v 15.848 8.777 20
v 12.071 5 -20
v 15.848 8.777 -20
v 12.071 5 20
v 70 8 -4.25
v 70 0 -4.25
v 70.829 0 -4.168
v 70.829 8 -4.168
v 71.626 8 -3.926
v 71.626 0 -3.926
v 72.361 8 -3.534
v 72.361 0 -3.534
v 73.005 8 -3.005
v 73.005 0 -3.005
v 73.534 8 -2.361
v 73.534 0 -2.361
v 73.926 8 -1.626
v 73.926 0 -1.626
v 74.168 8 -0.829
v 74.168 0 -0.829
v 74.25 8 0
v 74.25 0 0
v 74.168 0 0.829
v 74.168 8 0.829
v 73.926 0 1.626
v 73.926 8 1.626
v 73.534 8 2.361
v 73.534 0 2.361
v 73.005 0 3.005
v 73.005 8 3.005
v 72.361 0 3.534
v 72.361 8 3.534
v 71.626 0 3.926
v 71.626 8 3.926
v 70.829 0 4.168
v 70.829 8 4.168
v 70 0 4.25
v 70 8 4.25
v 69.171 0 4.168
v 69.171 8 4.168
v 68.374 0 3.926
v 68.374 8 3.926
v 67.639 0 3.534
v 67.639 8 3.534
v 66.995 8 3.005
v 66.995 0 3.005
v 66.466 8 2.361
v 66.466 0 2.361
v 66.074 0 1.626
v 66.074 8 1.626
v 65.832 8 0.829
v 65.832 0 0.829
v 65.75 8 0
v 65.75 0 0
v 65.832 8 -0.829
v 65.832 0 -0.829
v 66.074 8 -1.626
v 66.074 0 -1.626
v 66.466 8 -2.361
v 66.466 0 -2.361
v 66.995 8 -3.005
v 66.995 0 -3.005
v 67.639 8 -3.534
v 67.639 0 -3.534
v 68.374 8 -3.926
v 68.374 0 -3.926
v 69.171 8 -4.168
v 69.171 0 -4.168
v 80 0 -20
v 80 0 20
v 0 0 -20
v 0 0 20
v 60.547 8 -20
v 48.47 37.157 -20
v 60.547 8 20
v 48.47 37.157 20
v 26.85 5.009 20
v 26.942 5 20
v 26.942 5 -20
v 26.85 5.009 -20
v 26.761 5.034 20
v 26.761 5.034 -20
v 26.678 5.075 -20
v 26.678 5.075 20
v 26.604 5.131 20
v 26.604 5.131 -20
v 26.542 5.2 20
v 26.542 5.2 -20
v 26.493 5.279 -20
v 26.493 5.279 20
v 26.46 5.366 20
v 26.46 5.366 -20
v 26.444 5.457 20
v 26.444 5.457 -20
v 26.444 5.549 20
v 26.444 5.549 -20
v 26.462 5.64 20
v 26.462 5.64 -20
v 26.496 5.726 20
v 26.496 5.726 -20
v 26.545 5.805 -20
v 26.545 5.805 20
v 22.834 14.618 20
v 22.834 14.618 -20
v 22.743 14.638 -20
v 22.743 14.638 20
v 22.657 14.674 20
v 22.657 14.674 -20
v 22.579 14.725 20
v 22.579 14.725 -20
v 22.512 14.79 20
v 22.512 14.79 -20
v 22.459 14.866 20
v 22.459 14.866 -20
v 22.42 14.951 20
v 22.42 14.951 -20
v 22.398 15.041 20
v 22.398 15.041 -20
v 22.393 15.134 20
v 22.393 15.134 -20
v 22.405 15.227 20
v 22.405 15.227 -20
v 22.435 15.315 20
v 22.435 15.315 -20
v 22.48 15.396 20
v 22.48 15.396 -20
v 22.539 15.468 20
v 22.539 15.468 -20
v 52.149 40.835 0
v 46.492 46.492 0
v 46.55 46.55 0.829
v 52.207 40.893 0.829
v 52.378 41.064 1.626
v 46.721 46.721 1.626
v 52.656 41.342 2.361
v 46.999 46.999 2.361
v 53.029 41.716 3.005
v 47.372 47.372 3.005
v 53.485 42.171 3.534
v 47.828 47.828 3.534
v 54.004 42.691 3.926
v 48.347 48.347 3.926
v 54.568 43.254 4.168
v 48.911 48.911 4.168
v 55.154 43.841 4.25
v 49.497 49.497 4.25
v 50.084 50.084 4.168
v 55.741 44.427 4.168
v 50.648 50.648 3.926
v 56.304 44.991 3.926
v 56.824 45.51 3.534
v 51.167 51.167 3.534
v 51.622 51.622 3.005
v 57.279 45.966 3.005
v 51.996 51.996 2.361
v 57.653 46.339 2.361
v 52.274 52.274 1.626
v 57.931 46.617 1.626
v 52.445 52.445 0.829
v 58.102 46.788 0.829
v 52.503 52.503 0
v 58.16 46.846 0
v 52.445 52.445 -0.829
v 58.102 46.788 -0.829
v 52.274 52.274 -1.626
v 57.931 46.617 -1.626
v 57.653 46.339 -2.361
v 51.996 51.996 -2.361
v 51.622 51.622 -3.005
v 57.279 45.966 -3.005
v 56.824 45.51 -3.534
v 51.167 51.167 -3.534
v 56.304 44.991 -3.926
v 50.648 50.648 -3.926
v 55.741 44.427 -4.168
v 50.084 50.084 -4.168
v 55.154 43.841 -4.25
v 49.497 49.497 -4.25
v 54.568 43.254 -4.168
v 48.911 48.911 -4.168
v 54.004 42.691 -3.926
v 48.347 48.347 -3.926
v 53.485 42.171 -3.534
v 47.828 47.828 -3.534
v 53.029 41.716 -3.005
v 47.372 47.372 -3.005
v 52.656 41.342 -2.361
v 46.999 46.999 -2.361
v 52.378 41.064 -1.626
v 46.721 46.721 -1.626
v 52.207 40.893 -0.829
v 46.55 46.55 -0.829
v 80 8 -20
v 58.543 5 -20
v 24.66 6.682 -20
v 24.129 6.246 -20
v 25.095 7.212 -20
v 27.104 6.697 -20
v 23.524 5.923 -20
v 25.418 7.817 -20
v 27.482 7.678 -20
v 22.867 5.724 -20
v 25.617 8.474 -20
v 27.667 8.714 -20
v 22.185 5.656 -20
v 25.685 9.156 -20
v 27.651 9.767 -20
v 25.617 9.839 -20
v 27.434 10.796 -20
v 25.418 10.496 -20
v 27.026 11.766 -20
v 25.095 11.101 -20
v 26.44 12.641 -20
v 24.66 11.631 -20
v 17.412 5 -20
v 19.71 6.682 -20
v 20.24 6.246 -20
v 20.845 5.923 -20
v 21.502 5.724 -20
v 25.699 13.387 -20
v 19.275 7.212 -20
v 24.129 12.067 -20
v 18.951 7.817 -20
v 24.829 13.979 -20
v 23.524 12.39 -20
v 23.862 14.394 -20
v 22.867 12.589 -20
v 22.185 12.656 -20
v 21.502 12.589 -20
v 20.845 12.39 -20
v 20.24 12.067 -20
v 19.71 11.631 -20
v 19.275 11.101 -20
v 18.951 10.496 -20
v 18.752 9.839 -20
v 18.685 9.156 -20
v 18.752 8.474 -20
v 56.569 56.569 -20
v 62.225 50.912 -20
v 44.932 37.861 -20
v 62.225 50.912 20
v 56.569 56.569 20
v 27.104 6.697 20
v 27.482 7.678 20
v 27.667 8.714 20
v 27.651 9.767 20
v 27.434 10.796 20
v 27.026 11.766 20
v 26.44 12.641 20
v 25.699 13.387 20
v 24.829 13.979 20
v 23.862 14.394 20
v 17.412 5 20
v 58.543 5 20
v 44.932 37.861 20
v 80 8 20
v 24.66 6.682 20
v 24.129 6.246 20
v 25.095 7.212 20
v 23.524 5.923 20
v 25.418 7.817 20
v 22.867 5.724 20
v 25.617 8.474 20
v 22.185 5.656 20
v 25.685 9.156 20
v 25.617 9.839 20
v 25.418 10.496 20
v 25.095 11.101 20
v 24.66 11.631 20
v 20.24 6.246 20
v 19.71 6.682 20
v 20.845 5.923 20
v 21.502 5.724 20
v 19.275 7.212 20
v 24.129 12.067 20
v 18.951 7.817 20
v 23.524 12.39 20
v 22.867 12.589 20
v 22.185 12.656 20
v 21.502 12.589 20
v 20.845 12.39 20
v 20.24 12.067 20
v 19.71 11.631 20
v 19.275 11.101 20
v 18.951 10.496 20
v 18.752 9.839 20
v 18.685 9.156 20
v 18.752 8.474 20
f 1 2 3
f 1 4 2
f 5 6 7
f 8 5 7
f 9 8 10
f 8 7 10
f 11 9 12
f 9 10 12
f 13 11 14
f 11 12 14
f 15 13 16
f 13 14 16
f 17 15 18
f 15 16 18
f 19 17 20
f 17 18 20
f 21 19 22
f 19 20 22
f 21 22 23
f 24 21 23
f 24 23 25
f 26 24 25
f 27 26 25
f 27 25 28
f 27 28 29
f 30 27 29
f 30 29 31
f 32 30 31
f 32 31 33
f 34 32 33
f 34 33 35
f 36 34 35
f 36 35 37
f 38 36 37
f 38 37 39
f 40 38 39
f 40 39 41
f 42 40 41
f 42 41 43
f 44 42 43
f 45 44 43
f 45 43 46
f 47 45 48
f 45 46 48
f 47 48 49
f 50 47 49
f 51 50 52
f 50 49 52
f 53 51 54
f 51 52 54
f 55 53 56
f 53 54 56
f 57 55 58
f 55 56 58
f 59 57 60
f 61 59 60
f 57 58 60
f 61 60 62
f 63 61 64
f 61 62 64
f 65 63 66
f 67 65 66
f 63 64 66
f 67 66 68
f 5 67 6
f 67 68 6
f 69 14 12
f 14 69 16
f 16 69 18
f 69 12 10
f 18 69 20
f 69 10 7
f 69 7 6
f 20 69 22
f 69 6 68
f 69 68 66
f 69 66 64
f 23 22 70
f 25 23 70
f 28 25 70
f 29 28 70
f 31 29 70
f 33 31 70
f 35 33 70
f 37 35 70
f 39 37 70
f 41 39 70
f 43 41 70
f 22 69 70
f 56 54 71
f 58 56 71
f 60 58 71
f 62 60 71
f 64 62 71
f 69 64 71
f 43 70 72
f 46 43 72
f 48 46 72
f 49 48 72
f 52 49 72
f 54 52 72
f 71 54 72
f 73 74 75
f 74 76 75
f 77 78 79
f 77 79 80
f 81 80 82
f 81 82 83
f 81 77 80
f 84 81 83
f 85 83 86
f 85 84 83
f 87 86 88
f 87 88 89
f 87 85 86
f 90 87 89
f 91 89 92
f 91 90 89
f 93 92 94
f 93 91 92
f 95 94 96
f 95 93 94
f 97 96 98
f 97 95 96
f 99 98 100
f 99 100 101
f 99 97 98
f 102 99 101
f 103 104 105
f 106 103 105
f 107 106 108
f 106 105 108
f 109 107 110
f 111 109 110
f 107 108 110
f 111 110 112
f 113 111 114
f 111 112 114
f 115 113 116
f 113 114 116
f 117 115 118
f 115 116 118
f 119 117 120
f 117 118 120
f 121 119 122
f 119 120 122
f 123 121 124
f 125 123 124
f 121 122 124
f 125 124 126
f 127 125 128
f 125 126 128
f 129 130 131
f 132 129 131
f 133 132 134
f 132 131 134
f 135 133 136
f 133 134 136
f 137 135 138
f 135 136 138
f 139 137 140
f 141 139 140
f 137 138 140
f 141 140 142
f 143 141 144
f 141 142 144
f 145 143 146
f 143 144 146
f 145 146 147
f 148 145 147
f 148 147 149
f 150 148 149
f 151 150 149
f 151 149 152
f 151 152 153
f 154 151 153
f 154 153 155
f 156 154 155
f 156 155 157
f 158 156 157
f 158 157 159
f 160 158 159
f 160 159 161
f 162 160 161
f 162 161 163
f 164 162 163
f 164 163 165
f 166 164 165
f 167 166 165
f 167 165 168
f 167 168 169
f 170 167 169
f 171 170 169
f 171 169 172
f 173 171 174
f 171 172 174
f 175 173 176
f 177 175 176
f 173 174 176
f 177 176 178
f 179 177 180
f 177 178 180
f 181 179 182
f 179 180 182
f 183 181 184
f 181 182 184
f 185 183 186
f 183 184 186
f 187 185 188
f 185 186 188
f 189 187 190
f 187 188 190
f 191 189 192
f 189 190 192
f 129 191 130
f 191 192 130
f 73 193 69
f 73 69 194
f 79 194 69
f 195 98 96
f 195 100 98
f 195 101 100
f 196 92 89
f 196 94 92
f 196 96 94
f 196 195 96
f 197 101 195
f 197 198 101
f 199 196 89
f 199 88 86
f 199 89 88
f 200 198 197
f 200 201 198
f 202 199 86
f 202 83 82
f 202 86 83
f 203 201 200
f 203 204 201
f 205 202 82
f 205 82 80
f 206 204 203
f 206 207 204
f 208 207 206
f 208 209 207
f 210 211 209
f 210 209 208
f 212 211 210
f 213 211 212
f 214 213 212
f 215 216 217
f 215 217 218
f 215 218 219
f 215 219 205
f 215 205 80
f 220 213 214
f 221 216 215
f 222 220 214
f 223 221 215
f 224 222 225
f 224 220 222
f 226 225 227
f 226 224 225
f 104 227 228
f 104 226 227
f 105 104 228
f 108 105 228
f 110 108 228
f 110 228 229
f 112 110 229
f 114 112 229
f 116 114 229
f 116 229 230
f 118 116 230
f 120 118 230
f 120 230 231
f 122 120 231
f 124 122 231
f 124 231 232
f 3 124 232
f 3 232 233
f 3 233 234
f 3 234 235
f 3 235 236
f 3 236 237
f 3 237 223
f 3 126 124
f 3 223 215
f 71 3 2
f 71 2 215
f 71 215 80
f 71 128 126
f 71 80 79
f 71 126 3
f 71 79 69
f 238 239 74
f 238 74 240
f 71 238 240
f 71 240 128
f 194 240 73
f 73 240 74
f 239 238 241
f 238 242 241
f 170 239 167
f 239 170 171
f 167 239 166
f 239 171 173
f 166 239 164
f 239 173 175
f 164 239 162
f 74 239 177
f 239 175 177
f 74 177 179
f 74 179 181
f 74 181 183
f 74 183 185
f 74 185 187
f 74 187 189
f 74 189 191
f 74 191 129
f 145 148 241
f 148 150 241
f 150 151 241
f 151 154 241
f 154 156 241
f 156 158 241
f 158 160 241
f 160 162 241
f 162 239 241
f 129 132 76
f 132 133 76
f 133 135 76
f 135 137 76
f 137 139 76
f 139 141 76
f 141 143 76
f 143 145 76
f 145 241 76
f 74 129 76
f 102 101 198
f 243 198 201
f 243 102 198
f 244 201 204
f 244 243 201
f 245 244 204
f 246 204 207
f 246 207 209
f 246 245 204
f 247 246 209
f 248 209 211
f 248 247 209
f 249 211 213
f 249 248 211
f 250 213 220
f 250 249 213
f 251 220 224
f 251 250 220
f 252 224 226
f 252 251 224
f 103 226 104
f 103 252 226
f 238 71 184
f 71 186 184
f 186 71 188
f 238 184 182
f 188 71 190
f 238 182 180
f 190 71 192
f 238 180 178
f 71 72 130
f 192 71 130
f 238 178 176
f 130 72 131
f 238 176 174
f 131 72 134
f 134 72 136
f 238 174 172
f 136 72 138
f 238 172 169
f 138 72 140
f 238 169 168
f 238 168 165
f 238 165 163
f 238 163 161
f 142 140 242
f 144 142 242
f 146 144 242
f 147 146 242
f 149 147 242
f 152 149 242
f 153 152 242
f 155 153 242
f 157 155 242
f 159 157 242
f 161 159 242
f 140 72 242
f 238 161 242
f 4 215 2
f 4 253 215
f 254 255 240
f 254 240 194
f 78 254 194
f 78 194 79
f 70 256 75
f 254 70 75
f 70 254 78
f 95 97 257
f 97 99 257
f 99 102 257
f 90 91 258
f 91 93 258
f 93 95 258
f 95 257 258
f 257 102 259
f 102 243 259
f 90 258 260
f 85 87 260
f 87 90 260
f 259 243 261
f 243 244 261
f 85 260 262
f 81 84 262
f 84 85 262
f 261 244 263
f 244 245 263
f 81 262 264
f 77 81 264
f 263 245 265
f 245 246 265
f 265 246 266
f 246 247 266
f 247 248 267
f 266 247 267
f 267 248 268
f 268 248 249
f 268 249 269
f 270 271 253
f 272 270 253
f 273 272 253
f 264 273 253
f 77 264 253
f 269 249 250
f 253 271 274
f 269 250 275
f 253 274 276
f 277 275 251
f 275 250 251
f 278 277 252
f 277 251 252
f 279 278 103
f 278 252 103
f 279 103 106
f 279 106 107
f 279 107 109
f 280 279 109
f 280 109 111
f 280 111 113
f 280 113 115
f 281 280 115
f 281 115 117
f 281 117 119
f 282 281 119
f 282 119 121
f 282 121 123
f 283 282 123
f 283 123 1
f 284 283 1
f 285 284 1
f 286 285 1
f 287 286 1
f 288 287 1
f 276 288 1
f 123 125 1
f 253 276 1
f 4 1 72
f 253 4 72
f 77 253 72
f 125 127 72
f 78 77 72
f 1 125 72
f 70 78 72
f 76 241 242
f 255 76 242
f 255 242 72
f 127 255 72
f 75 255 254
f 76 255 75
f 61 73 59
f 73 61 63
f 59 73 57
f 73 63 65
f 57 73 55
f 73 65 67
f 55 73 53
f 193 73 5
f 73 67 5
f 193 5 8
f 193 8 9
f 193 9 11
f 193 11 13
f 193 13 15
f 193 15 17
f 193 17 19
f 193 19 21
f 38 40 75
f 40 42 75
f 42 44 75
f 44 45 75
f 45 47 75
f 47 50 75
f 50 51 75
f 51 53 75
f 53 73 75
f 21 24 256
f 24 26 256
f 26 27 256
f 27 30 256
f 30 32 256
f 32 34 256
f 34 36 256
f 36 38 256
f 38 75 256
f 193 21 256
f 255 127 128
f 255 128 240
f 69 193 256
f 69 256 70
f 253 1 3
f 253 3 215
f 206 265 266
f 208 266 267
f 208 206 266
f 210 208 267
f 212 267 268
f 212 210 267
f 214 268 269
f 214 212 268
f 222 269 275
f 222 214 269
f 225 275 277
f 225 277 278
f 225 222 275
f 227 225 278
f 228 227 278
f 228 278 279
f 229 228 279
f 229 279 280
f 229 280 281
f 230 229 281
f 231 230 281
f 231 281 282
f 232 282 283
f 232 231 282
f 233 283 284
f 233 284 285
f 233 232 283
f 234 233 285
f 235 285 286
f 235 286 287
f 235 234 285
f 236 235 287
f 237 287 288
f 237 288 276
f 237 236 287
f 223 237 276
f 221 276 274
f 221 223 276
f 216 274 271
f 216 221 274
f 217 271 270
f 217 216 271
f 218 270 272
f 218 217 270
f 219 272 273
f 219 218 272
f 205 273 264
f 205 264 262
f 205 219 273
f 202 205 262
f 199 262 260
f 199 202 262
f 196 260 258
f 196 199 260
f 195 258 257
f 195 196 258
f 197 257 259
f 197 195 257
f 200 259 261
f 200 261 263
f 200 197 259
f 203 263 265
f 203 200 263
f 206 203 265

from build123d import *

# Parameters (mm, degrees)
SKETCH_1_R          = 3.5
EXTRUDE_1_DEPTH     = 20
SKETCH_2_R          = 4.25
CUT_EXTRUDE_1_DEPTH = 20
SKETCH_3_R          = 4.25
CUT_EXTRUDE_2_DEPTH = 20


with BuildPart() as part:
    # 草图1 → 凸台-拉伸1 (new, symmetric)
    with BuildSketch(Plane.XY):
        Polygon((0, 0), (56.568542495, 56.568542495), (62.225396744, 50.911688245), (48.470353518, 37.156645019), (60.547431318, 8), (80, 8), (80, 0), align=None)
        with Locations((22.184677187, 9.156473773)):
            Circle(SKETCH_1_R, mode=Mode.SUBTRACT)
        Polygon((12.071067812, 5), (15.847671377, 8.776603565), (17.411991793, 5), align=None, mode=Mode.SUBTRACT)
        with BuildLine():
            Line((22.539170943, 15.468103131), (44.931612237, 37.860544425))
            Line((44.931612237, 37.860544425), (58.542895405, 5))
            Line((58.542895405, 5), (26.941798117, 5))
            ThreePointArc((26.941798117, 5), (26.493271042, 5.27903968), (26.545371373, 5.804706148))
            ThreePointArc((26.545371373, 5.804706148), (27.253512915, 11.291164467), (22.833720405, 14.61804341))
            ThreePointArc((22.833720405, 14.61804341), (22.420282519, 14.950846558), (22.539170943, 15.468103131))
        make_face(mode=Mode.SUBTRACT)
    extrude(amount=EXTRUDE_1_DEPTH, both=True)

    # 草图2 → 切除-拉伸1 (cut)
    with BuildSketch(Plane(origin=(0, 0, 0), x_dir=(0, 0, 1), z_dir=(-0.7071067811865488, 0.7071067811865464, 0))):
        with Locations(Location((0, 70, 0), (0, 0, 270))):
            Circle(SKETCH_2_R)
    extrude(amount=-CUT_EXTRUDE_1_DEPTH, mode=Mode.SUBTRACT)

    # 草图3 → 切除-拉伸2 (cut)
    with BuildSketch(Plane.XZ):
        with Locations(Location((70, 0, 0), (0, 0, 270))):
            Circle(SKETCH_3_R)
    extrude(amount=-CUT_EXTRUDE_2_DEPTH, mode=Mode.SUBTRACT)


solid = part.part
